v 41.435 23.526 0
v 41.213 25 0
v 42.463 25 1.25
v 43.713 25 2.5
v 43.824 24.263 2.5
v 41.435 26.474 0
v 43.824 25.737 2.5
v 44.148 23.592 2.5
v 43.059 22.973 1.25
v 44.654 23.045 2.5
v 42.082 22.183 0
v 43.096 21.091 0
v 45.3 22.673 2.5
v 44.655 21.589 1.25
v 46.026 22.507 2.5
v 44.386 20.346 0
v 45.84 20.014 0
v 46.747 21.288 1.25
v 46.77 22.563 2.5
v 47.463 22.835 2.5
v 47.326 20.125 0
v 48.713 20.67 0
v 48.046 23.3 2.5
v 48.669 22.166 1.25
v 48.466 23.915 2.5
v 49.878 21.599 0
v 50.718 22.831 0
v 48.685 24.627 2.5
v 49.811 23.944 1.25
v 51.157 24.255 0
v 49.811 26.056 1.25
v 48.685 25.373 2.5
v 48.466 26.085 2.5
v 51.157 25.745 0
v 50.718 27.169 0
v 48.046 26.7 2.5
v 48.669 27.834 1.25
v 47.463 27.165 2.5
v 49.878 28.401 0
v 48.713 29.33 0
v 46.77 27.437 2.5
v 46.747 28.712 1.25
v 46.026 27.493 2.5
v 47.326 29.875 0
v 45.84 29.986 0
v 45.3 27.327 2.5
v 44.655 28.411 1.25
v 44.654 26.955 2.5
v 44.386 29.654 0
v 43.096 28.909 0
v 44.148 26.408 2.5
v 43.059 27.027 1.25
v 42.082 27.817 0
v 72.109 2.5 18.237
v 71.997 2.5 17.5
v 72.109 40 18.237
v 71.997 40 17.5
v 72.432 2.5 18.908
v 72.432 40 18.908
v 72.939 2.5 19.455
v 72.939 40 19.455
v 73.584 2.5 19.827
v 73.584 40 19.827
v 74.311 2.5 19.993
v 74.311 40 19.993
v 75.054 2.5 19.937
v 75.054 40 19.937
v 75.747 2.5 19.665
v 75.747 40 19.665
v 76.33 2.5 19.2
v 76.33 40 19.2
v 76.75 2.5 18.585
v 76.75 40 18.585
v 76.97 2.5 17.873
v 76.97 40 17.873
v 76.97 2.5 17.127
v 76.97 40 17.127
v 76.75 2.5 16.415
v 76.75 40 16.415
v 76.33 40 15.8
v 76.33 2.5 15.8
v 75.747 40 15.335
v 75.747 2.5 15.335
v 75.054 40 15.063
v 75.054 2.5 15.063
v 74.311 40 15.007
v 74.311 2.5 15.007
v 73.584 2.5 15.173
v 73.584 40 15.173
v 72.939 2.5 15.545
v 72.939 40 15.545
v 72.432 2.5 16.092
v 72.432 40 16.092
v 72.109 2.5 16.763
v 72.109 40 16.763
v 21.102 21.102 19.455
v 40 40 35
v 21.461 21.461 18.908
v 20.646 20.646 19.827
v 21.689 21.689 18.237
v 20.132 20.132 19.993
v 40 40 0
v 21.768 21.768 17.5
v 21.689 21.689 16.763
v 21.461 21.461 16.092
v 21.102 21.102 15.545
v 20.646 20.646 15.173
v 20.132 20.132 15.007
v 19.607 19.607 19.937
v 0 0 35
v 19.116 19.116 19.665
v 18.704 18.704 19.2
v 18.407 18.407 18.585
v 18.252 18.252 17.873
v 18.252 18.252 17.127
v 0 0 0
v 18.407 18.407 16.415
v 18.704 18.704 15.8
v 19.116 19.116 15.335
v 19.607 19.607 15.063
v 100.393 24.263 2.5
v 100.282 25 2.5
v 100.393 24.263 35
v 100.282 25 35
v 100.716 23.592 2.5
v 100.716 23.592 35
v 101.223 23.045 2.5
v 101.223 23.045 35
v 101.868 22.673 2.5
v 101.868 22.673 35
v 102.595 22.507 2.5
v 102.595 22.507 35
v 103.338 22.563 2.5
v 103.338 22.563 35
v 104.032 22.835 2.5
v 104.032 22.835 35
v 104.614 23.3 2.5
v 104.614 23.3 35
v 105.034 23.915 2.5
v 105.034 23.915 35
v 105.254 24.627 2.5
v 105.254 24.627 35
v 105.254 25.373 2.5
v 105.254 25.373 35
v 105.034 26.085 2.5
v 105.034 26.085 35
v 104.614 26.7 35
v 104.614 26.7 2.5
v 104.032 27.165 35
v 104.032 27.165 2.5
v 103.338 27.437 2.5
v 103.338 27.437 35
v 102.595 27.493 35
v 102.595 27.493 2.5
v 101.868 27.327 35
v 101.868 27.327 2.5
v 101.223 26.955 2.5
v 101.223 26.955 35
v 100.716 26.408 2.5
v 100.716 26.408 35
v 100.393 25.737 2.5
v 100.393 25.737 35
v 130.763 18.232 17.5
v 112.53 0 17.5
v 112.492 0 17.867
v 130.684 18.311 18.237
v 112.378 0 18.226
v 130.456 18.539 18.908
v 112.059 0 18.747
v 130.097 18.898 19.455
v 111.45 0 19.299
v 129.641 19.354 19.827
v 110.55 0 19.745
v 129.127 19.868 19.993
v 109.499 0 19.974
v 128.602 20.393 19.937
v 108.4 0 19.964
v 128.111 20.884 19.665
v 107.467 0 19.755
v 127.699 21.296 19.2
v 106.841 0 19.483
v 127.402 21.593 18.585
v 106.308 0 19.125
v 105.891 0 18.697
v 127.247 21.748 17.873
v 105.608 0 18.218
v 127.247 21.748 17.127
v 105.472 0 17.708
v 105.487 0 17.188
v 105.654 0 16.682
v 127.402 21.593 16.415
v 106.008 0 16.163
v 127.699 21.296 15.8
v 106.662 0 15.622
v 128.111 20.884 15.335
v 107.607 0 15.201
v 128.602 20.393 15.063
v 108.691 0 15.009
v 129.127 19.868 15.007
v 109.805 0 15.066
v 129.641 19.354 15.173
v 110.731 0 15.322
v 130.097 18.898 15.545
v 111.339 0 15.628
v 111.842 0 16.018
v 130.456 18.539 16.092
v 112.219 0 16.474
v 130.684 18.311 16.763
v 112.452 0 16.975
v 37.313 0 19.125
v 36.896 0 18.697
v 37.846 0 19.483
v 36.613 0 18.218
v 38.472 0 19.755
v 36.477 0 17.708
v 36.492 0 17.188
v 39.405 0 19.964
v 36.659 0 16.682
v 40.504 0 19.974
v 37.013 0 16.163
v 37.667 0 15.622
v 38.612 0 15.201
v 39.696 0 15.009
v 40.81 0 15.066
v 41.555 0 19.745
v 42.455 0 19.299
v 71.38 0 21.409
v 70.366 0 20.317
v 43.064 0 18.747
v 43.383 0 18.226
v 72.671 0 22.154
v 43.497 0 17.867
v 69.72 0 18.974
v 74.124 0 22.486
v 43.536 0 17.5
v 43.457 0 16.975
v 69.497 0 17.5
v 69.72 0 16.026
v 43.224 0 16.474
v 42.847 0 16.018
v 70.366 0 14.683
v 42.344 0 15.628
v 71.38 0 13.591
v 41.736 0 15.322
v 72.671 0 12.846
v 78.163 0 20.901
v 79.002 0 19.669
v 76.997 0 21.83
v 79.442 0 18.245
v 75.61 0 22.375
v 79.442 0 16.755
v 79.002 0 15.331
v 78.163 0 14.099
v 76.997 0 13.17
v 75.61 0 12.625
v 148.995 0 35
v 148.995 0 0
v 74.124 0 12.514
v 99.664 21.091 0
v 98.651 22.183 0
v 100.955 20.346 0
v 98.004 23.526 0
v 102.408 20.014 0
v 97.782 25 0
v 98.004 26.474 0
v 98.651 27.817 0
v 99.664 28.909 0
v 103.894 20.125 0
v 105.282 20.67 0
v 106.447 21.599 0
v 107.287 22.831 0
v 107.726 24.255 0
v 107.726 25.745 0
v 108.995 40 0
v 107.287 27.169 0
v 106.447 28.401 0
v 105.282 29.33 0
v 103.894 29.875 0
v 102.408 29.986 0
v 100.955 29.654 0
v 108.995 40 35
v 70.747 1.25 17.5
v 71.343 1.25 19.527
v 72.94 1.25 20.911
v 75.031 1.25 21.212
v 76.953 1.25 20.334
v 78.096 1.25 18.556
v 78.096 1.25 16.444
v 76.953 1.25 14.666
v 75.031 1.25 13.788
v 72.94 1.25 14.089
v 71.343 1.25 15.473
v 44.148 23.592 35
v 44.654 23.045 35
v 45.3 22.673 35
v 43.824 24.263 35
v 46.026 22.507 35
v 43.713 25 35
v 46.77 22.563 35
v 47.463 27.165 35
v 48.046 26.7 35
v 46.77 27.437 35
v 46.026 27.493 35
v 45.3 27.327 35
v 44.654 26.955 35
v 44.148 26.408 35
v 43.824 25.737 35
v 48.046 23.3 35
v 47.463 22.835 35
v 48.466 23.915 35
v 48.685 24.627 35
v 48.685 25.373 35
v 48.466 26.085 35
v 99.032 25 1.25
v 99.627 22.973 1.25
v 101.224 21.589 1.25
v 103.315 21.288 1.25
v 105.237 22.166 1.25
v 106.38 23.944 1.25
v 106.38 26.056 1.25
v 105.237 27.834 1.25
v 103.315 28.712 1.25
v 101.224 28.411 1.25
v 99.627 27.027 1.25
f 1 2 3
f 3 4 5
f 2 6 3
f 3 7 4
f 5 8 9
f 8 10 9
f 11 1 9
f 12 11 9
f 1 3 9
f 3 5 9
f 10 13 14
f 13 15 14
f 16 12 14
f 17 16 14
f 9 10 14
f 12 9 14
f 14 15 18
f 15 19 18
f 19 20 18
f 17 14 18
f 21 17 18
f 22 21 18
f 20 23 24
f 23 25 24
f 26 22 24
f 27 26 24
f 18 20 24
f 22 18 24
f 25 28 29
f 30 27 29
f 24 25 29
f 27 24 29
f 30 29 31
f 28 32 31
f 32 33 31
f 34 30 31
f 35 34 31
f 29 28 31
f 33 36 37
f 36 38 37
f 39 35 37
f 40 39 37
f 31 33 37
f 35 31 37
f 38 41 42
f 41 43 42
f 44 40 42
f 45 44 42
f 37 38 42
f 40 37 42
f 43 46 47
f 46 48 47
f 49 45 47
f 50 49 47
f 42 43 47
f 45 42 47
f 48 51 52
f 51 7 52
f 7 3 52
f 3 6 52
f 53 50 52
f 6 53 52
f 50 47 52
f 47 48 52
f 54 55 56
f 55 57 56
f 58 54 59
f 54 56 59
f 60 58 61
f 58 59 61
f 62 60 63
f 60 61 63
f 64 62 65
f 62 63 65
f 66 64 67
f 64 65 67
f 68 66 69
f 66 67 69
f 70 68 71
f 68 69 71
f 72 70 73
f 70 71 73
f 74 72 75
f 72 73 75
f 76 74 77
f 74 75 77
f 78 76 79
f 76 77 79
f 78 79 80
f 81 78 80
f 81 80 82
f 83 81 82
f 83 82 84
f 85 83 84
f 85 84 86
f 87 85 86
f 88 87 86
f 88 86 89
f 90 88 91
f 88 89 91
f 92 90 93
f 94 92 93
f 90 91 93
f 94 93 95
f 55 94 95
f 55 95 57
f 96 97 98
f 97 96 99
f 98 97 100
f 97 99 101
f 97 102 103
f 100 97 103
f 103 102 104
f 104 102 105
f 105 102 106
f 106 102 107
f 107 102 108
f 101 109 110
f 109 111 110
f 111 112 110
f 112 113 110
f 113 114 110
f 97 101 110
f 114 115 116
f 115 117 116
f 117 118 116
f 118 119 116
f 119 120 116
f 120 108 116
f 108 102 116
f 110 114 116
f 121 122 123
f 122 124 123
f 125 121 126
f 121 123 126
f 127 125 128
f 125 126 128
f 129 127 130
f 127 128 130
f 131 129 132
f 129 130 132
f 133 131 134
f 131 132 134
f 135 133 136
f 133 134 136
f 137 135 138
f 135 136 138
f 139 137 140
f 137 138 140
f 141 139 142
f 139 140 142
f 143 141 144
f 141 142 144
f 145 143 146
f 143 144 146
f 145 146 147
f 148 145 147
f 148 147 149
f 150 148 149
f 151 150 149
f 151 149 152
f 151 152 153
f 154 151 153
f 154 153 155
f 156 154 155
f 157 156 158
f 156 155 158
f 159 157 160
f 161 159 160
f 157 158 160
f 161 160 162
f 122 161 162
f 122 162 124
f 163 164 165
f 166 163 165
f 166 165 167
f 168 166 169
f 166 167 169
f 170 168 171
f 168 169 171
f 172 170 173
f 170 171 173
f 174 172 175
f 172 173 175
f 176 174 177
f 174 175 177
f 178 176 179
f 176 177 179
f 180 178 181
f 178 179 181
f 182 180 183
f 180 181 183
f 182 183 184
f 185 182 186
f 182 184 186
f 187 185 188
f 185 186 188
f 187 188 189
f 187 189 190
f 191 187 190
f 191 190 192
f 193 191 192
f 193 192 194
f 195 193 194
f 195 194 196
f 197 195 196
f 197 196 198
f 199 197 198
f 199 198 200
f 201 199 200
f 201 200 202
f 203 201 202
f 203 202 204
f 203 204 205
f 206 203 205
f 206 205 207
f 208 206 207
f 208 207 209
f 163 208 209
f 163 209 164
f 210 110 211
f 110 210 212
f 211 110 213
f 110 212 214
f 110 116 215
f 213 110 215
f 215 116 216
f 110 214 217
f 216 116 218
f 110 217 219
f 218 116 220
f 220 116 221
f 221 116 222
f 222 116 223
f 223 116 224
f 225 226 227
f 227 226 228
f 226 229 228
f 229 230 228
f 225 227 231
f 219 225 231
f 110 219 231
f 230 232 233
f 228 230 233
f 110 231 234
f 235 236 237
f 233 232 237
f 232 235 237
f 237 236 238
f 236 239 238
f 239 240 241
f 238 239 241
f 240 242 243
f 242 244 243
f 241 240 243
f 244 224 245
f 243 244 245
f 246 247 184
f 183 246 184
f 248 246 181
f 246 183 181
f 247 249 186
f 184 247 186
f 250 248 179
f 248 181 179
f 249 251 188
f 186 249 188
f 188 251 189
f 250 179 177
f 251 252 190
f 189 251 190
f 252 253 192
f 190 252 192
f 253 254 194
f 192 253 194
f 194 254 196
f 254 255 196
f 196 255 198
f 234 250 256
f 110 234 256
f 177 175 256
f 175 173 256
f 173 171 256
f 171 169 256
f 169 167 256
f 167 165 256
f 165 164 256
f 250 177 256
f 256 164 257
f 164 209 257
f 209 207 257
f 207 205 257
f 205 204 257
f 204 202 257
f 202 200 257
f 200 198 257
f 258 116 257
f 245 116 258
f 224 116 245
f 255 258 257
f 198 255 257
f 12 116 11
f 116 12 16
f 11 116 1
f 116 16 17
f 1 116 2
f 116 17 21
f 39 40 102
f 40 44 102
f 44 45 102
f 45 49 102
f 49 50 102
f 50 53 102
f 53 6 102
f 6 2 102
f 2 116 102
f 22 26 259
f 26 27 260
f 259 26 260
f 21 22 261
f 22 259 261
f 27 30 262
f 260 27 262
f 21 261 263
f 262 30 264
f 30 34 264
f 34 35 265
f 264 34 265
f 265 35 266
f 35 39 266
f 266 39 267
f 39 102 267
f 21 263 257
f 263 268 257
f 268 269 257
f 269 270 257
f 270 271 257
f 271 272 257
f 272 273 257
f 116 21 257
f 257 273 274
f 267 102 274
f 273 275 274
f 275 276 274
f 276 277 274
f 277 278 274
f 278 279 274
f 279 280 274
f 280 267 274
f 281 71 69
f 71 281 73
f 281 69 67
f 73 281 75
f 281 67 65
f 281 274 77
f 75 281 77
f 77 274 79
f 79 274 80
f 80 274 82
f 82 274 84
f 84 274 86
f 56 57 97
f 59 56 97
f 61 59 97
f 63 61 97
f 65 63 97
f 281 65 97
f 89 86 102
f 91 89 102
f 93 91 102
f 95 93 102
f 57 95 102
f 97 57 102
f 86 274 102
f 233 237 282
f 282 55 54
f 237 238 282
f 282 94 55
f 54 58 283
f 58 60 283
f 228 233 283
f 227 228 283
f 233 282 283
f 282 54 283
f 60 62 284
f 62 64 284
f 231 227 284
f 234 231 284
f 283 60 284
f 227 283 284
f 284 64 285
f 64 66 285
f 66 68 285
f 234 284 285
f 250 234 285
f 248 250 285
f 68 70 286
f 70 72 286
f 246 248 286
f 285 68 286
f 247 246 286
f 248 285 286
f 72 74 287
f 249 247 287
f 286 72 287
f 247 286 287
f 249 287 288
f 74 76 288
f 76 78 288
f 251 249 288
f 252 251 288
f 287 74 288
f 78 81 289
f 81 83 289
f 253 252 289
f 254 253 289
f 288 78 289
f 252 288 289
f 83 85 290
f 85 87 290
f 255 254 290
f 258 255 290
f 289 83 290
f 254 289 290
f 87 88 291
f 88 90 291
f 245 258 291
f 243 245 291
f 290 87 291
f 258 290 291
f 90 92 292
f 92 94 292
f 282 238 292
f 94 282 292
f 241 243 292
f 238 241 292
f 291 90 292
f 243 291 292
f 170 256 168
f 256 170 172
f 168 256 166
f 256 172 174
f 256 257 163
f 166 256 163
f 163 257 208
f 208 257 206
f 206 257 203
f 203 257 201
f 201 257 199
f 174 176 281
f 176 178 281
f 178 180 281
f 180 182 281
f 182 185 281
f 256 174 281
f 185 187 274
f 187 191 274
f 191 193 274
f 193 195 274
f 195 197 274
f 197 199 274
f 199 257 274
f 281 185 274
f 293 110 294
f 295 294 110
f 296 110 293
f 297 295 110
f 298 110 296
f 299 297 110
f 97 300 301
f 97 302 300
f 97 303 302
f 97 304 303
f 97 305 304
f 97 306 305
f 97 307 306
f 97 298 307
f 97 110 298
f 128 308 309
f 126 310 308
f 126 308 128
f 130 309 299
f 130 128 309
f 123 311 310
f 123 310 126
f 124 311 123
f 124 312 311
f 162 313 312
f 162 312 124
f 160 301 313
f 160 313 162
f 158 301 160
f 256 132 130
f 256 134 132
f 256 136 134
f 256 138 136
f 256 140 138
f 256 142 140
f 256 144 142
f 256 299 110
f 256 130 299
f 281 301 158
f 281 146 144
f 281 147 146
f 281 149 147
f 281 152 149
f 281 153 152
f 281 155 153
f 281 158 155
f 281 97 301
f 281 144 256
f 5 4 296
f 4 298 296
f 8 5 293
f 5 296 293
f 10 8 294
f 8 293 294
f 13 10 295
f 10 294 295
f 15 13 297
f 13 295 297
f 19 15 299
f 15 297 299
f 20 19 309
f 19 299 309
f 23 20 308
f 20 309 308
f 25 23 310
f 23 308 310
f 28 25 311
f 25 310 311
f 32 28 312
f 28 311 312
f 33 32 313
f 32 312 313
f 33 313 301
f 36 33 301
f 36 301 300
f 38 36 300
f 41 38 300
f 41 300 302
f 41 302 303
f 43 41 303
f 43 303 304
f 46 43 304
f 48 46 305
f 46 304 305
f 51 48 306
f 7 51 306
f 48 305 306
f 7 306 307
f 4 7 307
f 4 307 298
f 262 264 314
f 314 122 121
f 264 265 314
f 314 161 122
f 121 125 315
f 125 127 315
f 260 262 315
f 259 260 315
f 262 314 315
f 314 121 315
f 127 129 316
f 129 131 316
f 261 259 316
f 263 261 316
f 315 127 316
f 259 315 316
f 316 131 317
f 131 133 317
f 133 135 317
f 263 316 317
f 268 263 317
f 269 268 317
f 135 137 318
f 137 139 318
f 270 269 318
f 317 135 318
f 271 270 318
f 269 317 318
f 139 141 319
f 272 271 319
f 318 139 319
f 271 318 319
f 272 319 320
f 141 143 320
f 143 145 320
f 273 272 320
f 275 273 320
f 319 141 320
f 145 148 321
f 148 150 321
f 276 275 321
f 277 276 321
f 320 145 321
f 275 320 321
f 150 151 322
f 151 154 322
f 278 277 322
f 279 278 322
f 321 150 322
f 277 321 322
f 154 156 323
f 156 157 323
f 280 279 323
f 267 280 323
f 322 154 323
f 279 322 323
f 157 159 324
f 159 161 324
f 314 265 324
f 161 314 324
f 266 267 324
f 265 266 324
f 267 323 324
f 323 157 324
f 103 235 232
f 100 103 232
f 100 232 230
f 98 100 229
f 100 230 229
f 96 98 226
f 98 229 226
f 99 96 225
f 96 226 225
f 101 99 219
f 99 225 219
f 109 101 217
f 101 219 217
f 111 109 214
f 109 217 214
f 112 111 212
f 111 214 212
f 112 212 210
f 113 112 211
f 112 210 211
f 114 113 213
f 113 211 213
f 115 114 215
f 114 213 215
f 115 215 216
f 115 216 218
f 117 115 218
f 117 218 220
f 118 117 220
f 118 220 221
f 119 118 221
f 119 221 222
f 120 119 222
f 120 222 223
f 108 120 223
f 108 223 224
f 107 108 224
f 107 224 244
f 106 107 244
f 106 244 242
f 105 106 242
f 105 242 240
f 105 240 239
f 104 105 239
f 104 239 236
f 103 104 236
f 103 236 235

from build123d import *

# Parameters (mm, degrees)
F1_DEPTH       = 35
F3_D           = 5
F3_CSINK_D     = 10
F3_CSINK_ANGLE = 90
F6_D           = 5
F7_D           = 5
F9_D           = 5
F9_CSINK_D     = 10
F9_CSINK_ANGLE = 90


with BuildPart() as f1:
    # F0 (on Top) → F1 (new body)
    with BuildSketch(Plane.XY):
        Polygon((40, 40), (0, 0), (148.994949, 0), (108.994949, 40), align=None)
    extrude(amount=F1_DEPTH)

    # F3 (through all)
    with Locations(Plane.XZ):
        with Locations((74.497449, 17.5)):
            CounterSinkHole(F3_D / 2, F3_CSINK_D / 2, counter_sink_angle=F3_CSINK_ANGLE)

    # F6 (through all)
    with Locations(Plane(origin=(0, 0, 0), x_dir=(-0.707107, -0.707107, 0), z_dir=(-0.707107, 0.707107, 0))):
        with Locations((-28.284271, 17.5)):
            Hole(F6_D / 2)

    # F7 (through all)
    with Locations(Plane(origin=(74.497475, 74.497475, 0), x_dir=(-0.707107, 0.707107, 0), z_dir=(0.707107, 0.707107, 0))):
        with Locations((-77.071068, 17.5)):
            Hole(F7_D / 2)

    # F9 (through all)
    with Locations(Plane(origin=(0, 0, 0), x_dir=(1, 0, 0), z_dir=(0, 0, -1))):
        with Locations((102.781746, -25), (46.213203, -25)):
            CounterSinkHole(F9_D / 2, F9_CSINK_D / 2, counter_sink_angle=F9_CSINK_ANGLE)


solid = f1.part
